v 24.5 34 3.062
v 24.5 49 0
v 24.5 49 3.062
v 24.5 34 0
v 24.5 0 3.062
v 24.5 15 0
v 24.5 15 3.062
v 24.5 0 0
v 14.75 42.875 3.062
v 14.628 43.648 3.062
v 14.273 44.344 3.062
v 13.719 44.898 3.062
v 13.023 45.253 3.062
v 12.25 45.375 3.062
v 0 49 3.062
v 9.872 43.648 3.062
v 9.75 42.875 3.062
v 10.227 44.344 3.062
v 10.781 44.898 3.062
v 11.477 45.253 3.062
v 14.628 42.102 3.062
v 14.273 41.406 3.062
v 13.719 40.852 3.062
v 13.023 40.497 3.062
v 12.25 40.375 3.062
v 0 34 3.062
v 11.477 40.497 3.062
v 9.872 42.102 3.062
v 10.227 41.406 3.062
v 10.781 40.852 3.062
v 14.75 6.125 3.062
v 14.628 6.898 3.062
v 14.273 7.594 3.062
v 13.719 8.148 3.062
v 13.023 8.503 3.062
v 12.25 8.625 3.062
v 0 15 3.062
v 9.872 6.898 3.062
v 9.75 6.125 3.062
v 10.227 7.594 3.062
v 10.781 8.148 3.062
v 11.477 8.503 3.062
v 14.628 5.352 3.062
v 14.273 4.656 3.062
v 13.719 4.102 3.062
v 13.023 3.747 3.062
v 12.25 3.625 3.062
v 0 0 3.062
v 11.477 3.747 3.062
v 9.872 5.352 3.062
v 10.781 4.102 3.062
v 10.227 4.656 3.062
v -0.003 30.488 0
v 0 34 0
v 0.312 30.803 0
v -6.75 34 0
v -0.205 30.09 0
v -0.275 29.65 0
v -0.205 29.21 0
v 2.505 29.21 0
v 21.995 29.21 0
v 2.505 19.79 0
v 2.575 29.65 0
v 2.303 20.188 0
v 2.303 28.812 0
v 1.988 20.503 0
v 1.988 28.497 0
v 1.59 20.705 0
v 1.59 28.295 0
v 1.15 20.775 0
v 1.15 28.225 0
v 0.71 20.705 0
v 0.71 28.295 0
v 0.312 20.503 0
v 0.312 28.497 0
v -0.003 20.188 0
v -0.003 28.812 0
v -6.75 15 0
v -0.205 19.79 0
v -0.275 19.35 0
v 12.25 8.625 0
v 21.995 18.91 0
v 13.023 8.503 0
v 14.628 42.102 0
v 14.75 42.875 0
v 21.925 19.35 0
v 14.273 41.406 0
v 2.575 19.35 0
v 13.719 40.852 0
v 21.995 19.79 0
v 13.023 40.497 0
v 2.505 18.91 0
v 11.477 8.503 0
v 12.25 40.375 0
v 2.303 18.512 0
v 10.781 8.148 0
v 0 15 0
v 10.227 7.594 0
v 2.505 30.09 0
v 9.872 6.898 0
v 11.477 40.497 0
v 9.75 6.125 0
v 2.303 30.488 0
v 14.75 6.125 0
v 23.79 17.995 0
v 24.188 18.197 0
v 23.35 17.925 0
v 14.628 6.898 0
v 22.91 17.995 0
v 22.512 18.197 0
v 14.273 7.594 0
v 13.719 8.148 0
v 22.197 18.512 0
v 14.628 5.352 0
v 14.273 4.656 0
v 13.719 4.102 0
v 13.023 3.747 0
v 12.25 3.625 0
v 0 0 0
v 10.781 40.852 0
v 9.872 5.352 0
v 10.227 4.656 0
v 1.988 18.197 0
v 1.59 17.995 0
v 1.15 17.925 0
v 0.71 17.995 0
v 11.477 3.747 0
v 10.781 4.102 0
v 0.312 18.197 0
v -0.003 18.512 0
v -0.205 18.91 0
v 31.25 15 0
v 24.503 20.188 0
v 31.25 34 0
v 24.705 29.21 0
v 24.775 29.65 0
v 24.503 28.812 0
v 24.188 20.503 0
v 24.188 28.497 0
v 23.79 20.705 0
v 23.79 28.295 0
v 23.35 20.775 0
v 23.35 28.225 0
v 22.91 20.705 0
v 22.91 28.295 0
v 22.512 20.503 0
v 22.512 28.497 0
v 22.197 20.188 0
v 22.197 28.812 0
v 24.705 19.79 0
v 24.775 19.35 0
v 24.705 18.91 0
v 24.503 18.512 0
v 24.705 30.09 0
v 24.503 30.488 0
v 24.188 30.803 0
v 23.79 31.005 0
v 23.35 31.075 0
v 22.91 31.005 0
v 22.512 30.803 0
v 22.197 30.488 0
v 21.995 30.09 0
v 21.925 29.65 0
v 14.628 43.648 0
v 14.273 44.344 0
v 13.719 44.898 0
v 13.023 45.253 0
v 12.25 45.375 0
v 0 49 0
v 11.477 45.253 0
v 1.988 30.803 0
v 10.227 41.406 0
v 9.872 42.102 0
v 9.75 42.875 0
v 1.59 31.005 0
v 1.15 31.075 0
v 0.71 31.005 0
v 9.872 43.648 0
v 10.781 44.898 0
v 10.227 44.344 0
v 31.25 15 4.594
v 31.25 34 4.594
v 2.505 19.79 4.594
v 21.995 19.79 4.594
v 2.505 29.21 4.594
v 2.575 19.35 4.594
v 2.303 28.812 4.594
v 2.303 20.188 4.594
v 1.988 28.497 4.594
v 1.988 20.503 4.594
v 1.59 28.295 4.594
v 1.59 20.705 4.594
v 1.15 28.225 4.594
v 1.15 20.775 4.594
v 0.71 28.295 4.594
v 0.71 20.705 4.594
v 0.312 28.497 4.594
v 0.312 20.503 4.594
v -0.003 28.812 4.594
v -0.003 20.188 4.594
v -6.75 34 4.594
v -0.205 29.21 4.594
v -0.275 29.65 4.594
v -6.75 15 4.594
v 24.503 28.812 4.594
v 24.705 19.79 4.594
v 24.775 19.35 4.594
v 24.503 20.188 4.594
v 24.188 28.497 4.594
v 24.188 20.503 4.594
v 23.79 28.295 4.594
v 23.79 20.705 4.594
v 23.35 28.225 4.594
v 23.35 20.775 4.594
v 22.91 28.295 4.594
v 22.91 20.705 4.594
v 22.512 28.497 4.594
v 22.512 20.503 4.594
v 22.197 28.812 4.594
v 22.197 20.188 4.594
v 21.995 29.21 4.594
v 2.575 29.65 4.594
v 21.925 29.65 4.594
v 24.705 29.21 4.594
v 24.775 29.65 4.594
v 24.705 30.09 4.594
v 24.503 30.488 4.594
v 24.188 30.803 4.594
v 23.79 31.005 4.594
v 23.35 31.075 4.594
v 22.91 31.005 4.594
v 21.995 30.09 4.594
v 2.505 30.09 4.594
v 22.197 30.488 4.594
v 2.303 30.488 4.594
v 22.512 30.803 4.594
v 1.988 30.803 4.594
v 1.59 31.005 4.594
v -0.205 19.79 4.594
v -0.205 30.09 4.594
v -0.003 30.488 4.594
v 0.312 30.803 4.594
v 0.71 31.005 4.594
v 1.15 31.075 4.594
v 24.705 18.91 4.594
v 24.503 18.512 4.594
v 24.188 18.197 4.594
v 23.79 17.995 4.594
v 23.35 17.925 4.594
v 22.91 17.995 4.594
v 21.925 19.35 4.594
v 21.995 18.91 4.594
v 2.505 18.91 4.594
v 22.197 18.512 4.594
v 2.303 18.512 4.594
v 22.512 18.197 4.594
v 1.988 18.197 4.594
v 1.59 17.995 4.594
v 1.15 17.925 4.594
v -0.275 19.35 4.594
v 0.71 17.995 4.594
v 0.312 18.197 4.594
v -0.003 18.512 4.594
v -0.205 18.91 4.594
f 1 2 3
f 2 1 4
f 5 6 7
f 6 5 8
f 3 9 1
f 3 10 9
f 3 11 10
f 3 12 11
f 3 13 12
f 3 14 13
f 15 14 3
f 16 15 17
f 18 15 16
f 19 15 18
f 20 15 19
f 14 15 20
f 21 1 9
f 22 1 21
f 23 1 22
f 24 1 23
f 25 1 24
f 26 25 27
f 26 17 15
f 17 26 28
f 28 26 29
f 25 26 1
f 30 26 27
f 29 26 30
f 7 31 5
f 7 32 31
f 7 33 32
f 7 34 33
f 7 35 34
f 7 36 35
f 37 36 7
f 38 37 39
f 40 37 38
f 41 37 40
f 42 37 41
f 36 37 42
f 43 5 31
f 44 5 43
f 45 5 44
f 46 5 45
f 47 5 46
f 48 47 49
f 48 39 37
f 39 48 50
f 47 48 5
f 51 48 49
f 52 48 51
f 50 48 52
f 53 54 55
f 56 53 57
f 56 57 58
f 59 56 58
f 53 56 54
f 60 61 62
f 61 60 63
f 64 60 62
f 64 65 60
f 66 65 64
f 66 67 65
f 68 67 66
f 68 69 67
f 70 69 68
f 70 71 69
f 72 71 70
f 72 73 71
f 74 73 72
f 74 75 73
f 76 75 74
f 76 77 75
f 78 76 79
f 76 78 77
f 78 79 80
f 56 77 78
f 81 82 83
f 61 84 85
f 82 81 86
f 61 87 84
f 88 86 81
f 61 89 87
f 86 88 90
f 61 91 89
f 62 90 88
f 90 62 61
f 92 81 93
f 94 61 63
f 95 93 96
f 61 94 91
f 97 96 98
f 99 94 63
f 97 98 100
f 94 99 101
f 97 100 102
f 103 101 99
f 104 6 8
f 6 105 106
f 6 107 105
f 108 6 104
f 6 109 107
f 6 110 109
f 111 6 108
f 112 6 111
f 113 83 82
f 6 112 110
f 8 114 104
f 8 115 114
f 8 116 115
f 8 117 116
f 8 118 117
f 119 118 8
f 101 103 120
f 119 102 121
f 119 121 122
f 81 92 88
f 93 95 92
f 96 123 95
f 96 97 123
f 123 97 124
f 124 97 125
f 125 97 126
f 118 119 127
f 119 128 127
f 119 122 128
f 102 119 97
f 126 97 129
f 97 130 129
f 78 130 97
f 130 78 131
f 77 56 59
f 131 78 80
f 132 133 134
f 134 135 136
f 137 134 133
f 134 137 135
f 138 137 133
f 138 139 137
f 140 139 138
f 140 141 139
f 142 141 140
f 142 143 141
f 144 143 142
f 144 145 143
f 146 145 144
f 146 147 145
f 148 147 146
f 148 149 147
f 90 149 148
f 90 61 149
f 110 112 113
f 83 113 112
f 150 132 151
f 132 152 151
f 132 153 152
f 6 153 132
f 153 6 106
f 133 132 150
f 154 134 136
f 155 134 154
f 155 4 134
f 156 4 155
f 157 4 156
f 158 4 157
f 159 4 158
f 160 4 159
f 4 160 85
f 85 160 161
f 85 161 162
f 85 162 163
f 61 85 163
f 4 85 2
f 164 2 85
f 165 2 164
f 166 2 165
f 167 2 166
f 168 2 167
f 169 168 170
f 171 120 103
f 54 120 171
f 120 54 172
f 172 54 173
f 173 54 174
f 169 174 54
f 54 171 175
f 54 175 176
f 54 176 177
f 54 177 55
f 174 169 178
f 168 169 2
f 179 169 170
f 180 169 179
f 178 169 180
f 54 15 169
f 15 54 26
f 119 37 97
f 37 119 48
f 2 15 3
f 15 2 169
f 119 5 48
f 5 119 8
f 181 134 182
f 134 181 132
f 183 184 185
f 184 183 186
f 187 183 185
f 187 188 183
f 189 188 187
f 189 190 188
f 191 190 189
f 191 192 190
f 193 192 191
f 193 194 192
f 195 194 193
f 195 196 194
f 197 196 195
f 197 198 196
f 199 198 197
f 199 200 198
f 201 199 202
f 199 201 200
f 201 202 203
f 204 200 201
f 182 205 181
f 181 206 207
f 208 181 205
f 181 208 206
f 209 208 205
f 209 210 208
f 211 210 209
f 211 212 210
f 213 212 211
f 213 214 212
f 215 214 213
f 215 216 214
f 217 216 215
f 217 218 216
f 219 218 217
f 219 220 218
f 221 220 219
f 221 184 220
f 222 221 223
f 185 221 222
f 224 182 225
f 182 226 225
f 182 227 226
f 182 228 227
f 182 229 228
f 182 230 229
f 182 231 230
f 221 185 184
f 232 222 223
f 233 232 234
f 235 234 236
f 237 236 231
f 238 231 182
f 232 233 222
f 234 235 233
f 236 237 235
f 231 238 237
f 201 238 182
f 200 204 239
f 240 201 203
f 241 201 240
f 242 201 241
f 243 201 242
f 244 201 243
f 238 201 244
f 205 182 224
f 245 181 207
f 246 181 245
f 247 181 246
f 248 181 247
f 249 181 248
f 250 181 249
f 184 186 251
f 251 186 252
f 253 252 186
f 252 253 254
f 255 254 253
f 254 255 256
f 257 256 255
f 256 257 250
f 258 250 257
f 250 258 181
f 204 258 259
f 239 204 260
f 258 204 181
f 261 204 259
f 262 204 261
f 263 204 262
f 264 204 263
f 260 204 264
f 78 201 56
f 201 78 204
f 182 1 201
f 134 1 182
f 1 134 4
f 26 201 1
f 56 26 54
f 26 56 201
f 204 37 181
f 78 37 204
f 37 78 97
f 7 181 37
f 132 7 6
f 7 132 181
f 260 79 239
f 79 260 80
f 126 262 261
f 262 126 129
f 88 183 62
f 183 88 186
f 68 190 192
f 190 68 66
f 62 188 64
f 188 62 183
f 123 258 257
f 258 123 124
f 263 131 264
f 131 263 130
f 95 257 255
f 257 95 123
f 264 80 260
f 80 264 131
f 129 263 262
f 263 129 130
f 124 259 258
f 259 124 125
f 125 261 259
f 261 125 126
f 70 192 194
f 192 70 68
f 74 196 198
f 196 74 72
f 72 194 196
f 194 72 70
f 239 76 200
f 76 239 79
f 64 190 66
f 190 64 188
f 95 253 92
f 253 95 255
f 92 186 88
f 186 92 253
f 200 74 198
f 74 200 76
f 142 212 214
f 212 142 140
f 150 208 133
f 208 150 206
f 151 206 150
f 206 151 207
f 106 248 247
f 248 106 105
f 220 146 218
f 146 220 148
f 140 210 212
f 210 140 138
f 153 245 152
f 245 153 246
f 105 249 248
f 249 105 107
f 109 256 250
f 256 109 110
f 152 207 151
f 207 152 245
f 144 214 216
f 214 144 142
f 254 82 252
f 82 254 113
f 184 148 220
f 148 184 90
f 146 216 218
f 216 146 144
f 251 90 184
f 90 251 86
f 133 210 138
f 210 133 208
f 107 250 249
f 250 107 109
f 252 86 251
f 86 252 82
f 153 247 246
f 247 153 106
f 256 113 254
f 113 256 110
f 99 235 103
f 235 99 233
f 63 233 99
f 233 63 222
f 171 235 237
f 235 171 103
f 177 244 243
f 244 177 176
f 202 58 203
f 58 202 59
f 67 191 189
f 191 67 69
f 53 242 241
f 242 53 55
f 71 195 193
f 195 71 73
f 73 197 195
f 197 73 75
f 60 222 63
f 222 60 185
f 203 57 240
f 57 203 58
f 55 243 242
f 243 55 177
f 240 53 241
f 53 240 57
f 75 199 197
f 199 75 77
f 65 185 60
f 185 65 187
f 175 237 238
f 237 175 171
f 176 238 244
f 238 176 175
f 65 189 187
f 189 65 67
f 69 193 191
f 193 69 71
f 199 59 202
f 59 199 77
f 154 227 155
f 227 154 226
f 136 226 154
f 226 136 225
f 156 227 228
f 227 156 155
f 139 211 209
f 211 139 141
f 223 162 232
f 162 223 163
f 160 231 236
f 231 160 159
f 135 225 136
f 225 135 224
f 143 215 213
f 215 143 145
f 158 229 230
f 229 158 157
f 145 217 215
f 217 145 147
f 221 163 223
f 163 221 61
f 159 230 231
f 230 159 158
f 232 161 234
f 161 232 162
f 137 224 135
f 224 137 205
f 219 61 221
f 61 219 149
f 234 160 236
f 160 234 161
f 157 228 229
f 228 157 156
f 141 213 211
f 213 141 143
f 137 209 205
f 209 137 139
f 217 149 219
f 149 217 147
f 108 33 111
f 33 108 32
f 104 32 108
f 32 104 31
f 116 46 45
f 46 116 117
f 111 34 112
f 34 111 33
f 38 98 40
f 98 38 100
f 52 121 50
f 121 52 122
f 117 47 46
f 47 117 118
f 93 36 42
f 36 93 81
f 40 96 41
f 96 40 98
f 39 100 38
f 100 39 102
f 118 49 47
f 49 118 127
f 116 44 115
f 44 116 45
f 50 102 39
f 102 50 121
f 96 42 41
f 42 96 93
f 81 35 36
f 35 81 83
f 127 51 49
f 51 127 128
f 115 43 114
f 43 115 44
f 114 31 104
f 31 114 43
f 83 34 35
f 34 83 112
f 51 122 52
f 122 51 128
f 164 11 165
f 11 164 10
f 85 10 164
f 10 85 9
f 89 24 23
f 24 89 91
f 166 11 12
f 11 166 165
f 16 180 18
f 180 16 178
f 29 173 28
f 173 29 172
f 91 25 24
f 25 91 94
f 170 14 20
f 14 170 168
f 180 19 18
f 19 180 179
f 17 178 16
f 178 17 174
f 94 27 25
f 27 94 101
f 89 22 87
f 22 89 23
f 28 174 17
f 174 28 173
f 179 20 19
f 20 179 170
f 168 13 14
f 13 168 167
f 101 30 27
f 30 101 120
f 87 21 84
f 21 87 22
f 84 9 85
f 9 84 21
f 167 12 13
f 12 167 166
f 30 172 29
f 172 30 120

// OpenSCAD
//Base plate for mounting a limit switch to 1" alumunum tubing (or whatever)
// switch we use is https://www.omron.com/ecb/products/sw/11/v.html
// we're just tapping the switch holes for an m3 bolt

in=24.5;

//base that attaches to frame
bl=1*in;
bw=2*in;
bh=in/8;	//thickness
bhl=bl/2;
bhw=1.5*in;
bhd = 5;		//hole diameter

//switch mount
sl=38;
sw=19;
sh=in/16;		//make this > 0 if the switch should sit higher than the base plate

//switch mount holes
//change these to match your switch hole positions
//these are in mm width and will be from the center of the plate
shl=22.2;
shw=10.3;
shd=2.85;

difference() {
	union() {
		cube([bl, bw, bh]);
		translate([bl/2-sl/2, bw/2-sw/2, 0]) cube([sl, sw, bh+sh]);
	}
	$fn=20;
	translate([bl/2, bw/2-bhw/2, 0]) cylinder(d=bhd, h=bh);
	translate([bl/2, bw/2+bhw/2, 0]) cylinder(d=bhd, h=bh);
	translate([bl/2-sl/2, bw/2-sw/2, 0])	
		union() {
			for (i=[[sl/2-shl/2, sw/2-shw/2], [sl/2+shl/2, sw/2-shw/2], [sl/2-shl/2, sw/2+shw/2], [sl/2+shl/2, sw/2+shw/2]]){
				translate(i) cylinder(d=shd, h=bh+sh);
			}
		}
}
